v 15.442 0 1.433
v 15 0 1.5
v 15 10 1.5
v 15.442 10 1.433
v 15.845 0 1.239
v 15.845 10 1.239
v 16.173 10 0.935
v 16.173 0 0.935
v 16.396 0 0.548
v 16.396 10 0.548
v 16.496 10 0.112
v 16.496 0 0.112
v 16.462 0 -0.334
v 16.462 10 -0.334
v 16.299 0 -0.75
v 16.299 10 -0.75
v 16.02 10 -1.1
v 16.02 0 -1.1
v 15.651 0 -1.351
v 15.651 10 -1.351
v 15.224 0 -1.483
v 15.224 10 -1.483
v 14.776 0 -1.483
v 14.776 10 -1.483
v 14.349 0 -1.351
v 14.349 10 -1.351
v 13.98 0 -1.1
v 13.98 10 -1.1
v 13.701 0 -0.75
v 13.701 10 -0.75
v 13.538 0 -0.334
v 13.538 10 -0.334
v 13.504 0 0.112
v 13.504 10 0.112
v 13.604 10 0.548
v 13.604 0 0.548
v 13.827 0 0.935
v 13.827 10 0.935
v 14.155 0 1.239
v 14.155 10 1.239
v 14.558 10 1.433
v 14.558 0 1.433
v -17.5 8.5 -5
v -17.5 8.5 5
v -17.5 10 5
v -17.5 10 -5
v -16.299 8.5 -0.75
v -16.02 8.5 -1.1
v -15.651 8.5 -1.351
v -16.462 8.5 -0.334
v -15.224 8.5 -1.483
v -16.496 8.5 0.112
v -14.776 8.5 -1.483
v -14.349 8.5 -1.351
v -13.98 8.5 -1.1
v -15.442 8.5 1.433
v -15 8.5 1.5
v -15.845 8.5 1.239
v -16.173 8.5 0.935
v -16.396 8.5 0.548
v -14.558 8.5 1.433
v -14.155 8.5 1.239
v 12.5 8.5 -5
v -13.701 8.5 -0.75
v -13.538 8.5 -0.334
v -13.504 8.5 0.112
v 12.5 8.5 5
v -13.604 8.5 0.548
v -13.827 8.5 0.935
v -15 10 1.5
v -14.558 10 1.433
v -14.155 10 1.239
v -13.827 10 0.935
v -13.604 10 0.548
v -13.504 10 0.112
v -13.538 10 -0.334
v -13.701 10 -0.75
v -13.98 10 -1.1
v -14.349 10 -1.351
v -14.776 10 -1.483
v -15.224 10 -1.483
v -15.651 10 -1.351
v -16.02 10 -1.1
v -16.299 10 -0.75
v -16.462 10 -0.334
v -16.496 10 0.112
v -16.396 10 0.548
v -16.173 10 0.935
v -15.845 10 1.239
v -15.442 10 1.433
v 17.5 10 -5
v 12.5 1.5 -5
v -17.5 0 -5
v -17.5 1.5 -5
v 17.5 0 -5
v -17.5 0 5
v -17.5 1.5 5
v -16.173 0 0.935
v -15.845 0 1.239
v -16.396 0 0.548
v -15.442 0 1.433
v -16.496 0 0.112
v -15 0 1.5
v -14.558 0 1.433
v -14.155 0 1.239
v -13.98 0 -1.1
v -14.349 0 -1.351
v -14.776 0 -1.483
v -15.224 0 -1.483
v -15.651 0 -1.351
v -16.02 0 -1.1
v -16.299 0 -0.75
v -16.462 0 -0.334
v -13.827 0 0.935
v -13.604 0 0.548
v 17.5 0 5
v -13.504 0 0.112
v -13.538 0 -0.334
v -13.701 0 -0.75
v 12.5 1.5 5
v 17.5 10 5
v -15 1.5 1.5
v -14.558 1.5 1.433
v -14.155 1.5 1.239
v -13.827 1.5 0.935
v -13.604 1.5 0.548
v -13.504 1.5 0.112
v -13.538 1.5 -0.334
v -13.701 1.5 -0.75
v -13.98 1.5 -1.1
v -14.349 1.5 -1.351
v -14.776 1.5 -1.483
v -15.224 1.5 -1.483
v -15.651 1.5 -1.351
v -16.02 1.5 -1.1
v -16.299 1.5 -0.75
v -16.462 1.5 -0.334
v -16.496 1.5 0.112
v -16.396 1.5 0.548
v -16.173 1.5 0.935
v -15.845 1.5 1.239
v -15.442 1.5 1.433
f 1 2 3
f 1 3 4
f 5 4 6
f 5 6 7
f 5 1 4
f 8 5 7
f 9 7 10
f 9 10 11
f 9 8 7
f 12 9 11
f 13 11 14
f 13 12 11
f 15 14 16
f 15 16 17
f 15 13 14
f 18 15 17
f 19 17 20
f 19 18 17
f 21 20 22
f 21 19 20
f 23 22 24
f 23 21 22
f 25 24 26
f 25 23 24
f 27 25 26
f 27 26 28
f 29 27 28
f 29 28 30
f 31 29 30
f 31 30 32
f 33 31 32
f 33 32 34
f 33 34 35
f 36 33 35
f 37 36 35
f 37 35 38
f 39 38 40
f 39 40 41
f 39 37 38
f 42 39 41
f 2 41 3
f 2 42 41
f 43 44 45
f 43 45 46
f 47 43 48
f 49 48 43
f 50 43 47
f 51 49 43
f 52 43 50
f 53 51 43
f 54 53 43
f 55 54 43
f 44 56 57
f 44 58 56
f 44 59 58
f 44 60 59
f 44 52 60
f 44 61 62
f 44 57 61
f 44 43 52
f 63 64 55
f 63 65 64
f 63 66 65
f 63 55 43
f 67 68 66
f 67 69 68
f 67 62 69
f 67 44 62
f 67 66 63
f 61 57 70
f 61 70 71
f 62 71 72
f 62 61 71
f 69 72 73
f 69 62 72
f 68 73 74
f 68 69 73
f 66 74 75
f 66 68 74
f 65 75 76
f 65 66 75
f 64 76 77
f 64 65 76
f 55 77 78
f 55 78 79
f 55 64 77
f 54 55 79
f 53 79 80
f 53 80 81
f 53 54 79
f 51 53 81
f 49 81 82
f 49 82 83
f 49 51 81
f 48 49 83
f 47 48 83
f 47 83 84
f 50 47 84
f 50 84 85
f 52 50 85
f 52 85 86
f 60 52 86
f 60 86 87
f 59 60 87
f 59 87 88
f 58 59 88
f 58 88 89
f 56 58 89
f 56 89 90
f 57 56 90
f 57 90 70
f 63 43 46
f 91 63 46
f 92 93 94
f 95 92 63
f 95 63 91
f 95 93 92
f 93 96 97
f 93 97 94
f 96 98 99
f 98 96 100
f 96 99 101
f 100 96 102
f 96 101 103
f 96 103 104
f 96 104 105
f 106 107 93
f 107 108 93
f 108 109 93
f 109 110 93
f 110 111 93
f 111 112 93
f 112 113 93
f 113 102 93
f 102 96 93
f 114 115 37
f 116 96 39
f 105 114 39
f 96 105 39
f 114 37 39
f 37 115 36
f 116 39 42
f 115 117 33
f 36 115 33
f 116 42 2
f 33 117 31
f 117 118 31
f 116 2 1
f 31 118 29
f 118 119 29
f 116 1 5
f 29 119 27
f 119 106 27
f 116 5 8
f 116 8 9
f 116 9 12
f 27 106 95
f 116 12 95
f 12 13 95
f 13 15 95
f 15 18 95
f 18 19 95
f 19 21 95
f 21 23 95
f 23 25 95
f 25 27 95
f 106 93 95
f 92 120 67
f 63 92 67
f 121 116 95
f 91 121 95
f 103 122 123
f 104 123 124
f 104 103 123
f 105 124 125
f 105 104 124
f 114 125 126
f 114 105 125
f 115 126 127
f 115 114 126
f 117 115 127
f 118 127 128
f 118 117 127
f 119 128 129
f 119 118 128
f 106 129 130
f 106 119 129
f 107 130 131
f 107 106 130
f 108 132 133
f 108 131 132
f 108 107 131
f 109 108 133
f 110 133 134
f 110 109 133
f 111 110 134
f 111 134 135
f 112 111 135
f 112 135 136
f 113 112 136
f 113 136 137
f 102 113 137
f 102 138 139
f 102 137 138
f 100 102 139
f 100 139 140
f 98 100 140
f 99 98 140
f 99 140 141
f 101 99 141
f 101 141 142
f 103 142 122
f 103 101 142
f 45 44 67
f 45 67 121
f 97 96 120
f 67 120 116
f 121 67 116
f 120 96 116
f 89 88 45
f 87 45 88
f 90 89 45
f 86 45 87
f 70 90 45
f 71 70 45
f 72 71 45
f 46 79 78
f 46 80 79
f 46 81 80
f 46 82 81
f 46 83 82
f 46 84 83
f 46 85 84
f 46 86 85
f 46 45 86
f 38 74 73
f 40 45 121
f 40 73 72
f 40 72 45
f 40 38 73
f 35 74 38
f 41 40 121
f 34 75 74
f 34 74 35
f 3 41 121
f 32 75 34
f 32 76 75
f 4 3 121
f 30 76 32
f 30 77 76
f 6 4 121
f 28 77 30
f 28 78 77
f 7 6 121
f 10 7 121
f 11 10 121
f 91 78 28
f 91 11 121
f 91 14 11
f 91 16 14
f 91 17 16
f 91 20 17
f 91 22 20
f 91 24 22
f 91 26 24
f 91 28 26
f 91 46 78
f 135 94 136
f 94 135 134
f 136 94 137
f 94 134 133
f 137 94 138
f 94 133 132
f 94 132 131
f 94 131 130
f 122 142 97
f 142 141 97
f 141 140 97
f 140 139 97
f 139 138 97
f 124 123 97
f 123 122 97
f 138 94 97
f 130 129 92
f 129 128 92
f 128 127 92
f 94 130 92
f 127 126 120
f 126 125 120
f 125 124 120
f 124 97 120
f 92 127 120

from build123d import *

# Parameters (mm, degrees)
SKETCH1_W           = 35
SKETCH1_H           = 10
SKETCH1_R           = 1.5
BOSS_EXTRUDE1_DEPTH = 10
SKETCH2_W           = 60
SKETCH2_H           = 7
CUT_EXTRUDE1_DEPTH  = 10


with BuildPart() as part:
    # Sketch1 → Boss-Extrude1 (new body)
    with BuildSketch(Plane(origin=(0, 0, 0), x_dir=(1, 0, 0), z_dir=(0, 1, 0))):
        Rectangle(SKETCH1_W, SKETCH1_H)
        with Locations(Location((-15, 0, 0), (0, 0, 270))):
            Circle(SKETCH1_R, mode=Mode.SUBTRACT)
        with Locations(Location((15, 0, 0), (0, 0, 270))):
            Circle(SKETCH1_R, mode=Mode.SUBTRACT)
    extrude(amount=BOSS_EXTRUDE1_DEPTH)

    # Sketch2 → Cut-Extrude1 (cut)
    with BuildSketch(Plane.XY.offset(5)):
        with Locations((-17.5, 5)):
            Rectangle(SKETCH2_W, SKETCH2_H)
    extrude(amount=-CUT_EXTRUDE1_DEPTH, mode=Mode.SUBTRACT)


solid = part.part
